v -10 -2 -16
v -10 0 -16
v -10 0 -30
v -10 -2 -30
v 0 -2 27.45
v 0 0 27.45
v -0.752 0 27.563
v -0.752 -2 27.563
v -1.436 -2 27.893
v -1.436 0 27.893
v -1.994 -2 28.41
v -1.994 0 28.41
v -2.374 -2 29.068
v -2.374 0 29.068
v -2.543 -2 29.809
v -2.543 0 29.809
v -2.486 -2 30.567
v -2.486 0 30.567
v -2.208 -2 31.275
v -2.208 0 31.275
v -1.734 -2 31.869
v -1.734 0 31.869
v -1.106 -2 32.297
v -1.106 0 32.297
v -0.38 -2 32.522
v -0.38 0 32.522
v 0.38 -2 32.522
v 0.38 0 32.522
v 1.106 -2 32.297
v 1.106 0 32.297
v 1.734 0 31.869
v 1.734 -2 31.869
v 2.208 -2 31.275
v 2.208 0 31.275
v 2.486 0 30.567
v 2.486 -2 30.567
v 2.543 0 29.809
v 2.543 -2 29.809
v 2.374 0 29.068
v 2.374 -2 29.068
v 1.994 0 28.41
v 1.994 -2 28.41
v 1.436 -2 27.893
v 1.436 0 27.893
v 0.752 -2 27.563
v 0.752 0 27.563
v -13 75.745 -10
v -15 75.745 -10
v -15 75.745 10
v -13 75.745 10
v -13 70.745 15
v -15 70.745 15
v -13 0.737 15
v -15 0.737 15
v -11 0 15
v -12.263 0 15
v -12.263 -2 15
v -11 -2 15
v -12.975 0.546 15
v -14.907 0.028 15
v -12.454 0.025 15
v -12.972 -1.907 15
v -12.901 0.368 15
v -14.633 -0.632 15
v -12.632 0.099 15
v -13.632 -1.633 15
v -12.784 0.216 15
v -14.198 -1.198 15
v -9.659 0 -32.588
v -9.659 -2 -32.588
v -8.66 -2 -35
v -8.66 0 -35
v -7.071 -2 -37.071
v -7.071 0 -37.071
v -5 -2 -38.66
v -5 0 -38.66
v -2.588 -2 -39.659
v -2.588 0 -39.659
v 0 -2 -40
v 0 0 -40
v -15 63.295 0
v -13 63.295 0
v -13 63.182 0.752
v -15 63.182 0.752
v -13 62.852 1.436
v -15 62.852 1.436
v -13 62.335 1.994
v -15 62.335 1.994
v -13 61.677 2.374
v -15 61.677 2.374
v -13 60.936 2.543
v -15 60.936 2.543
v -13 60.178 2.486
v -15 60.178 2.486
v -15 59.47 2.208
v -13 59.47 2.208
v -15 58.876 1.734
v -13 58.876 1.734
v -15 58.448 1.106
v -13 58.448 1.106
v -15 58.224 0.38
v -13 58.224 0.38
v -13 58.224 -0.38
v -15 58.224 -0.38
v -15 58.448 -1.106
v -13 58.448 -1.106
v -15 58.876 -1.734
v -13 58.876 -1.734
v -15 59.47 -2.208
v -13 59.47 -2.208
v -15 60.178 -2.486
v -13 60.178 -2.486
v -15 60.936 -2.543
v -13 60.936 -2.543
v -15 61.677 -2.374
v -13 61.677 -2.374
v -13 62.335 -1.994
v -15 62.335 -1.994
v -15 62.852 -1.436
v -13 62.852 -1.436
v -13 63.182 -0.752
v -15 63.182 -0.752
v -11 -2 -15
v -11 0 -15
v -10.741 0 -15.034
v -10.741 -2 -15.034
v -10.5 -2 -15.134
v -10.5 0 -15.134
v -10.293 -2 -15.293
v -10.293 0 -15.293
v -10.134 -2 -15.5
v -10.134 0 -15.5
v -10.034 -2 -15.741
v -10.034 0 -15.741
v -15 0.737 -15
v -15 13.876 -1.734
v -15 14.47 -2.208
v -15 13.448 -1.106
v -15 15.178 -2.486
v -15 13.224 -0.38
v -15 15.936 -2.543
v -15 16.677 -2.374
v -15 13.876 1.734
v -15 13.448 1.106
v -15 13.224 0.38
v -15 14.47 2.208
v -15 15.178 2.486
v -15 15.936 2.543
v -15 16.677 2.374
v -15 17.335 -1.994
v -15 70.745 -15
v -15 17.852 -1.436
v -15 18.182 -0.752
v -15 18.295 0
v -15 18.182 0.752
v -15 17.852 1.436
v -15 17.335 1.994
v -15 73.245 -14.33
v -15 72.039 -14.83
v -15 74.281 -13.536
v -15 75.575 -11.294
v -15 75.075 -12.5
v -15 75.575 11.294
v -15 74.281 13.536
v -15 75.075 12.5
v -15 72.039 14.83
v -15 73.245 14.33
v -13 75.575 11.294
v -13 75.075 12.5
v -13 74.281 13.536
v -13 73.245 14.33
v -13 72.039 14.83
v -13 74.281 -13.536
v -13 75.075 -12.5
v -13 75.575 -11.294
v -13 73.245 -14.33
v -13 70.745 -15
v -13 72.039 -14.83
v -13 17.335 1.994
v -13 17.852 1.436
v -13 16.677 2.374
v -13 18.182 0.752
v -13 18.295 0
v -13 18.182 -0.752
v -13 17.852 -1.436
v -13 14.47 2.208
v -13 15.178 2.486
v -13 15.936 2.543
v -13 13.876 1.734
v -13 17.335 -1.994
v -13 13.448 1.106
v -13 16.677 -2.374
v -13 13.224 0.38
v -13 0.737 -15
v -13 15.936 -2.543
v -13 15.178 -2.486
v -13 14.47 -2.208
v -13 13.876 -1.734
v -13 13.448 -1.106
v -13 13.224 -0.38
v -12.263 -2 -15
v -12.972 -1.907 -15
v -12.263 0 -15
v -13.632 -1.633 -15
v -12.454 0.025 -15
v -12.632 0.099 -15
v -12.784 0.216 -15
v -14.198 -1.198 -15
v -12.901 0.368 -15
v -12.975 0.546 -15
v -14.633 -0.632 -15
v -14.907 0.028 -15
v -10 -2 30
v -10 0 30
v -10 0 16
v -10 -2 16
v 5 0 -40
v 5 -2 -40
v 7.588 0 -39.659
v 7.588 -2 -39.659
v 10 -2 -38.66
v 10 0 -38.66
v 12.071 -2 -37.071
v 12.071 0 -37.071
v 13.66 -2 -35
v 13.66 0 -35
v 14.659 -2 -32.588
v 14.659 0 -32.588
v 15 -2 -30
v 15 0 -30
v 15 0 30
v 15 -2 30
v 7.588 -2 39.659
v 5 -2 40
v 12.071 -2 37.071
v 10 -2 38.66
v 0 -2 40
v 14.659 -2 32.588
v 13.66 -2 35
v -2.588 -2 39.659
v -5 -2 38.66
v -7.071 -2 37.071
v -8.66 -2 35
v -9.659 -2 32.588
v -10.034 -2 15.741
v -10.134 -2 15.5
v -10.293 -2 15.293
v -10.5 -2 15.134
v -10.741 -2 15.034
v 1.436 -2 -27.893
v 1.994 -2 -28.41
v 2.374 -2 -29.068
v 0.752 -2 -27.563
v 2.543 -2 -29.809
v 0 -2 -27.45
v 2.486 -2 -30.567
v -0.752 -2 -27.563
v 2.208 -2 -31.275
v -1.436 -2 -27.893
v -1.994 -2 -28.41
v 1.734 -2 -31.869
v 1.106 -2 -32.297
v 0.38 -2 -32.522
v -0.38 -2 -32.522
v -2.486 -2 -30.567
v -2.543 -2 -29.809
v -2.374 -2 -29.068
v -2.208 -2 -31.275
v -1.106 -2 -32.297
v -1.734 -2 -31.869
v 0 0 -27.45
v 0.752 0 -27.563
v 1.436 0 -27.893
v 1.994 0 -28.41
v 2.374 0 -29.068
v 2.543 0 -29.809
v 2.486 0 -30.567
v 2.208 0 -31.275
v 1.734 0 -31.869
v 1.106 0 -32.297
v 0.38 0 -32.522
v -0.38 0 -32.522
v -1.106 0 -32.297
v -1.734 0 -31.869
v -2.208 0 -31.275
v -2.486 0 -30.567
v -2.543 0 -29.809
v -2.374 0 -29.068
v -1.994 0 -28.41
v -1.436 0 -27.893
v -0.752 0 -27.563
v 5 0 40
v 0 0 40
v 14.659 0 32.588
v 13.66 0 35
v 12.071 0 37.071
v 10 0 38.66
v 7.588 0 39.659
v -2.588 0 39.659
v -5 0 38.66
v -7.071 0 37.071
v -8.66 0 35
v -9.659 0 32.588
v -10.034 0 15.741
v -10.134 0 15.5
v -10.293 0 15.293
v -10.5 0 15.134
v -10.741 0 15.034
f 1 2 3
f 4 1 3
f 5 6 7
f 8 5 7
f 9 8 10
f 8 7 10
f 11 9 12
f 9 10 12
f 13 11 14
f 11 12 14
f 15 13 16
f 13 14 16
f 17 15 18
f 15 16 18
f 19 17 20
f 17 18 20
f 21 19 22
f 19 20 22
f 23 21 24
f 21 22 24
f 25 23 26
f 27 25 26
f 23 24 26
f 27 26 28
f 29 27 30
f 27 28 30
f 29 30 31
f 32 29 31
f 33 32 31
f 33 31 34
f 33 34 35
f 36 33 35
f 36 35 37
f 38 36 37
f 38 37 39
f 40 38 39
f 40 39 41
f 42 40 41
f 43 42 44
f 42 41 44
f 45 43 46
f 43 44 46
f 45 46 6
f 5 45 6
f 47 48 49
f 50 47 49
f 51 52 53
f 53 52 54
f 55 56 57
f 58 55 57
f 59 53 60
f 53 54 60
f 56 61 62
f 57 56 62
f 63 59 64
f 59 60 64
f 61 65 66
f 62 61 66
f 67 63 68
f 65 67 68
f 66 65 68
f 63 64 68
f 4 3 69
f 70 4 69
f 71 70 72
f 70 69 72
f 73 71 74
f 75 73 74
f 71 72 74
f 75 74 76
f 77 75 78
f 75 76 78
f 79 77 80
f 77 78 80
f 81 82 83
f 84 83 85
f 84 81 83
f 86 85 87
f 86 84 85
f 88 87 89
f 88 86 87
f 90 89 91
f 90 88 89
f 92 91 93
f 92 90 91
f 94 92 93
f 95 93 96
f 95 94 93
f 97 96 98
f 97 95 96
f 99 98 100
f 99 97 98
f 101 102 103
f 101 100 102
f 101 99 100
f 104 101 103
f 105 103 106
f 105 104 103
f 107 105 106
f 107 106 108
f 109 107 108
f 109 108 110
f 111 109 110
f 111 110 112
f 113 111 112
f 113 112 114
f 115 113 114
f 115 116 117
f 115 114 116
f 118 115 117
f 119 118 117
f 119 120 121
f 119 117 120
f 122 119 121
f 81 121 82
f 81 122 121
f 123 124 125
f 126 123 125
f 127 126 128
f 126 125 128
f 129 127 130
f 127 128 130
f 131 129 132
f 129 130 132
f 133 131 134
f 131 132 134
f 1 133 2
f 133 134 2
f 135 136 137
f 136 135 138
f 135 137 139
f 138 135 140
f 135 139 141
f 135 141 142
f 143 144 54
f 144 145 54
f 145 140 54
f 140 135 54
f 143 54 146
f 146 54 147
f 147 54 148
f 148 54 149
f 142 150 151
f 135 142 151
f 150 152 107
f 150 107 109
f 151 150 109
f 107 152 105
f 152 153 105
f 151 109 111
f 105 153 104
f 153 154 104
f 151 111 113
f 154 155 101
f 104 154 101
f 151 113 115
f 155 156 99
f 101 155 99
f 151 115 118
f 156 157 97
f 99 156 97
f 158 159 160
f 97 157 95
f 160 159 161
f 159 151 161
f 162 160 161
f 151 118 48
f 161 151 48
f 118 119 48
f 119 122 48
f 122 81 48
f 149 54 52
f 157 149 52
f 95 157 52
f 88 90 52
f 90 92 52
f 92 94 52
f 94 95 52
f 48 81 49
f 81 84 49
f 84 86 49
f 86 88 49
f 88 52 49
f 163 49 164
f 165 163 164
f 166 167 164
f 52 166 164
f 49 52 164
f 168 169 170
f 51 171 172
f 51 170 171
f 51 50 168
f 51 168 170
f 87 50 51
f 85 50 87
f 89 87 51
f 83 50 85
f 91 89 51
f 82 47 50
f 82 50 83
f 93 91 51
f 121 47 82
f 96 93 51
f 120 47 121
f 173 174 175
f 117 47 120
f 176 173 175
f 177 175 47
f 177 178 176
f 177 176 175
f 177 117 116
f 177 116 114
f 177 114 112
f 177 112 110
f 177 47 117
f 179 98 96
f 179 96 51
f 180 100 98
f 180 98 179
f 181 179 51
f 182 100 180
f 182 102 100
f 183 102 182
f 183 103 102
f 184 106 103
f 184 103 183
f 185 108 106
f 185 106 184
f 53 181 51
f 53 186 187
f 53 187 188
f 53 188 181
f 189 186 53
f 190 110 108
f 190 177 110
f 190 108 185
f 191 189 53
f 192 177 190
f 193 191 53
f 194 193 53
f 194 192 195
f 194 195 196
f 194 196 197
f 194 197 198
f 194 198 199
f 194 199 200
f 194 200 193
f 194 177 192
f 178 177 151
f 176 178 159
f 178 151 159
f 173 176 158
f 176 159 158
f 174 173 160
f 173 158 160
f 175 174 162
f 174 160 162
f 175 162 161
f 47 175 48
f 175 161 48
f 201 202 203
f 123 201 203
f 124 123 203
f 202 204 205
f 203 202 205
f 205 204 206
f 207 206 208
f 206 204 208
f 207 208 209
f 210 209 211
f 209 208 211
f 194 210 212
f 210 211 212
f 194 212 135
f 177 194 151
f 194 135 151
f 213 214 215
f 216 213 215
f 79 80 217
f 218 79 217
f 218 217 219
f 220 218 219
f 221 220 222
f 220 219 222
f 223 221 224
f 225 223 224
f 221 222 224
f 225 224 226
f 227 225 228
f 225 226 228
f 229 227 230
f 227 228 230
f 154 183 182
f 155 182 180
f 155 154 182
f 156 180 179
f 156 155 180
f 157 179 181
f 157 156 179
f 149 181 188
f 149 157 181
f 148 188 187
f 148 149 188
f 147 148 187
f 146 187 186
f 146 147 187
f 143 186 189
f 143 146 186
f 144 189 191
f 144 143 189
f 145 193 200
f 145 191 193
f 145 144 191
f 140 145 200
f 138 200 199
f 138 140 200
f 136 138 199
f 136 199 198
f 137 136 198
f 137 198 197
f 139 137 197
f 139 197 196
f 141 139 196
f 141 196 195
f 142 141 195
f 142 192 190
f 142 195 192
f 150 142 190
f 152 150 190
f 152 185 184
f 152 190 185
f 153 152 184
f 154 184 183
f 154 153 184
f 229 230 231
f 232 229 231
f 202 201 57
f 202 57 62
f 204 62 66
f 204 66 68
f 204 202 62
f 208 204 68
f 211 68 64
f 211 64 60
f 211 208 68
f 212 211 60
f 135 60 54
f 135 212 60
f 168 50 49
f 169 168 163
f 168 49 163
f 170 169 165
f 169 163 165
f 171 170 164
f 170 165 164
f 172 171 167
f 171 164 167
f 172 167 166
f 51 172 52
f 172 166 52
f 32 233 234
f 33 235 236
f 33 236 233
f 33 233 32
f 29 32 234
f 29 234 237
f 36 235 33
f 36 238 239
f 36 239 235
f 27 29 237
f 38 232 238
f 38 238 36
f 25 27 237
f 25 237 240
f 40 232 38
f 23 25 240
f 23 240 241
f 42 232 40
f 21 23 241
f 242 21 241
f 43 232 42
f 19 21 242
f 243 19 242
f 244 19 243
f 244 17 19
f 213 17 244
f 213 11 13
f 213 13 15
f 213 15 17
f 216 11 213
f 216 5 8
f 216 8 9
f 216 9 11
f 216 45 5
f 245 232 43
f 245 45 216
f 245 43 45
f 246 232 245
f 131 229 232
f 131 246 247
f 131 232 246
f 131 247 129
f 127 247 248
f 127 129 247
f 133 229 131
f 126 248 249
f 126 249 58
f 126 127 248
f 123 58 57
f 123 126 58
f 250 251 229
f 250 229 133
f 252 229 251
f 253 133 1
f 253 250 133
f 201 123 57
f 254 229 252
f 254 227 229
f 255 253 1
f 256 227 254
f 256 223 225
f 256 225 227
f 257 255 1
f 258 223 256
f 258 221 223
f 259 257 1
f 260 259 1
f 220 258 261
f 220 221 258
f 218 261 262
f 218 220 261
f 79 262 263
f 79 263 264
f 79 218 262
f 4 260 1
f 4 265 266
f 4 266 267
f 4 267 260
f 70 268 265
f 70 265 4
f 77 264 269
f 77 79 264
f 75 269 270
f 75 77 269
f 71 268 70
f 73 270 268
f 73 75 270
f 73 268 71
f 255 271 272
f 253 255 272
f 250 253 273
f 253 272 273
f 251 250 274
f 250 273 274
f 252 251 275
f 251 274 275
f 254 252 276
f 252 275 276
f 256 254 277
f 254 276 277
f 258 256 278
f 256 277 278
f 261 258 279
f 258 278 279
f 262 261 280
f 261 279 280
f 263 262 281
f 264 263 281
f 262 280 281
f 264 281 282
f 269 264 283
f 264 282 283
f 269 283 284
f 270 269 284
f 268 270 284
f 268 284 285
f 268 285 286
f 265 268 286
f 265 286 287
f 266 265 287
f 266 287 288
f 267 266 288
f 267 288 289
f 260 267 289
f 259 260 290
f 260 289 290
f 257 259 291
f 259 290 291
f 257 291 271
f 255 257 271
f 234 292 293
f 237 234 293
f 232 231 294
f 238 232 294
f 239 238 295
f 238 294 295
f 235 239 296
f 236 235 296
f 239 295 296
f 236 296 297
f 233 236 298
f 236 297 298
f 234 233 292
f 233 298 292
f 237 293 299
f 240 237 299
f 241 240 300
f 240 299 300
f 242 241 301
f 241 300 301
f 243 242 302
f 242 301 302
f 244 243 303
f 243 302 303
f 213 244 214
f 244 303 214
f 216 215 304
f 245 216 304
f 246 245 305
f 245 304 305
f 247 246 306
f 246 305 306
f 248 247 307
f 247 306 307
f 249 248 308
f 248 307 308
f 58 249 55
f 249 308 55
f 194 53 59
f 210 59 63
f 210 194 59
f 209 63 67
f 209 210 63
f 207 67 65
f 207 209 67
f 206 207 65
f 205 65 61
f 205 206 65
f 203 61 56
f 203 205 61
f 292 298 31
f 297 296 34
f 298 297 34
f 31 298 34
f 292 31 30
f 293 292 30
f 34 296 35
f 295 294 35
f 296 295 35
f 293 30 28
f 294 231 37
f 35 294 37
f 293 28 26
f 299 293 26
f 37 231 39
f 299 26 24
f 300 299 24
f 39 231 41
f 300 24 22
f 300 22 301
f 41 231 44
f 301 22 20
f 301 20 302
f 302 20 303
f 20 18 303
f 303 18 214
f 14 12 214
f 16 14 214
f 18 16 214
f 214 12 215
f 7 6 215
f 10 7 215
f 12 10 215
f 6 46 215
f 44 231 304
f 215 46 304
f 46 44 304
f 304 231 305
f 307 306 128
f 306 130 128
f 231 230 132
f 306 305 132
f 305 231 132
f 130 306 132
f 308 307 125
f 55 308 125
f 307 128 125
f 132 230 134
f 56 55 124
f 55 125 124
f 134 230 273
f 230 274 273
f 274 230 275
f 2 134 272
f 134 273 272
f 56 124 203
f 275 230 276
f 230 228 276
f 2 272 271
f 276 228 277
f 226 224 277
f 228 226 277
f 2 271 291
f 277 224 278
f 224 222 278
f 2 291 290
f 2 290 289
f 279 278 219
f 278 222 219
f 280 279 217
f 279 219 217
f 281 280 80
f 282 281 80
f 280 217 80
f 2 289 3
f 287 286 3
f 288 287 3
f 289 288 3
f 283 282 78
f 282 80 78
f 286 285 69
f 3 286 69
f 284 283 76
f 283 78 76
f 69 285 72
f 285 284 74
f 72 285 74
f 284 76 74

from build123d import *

# Parameters (mm, degrees)
SKETCH1_R                  = 2.55
BASE_FLANGE1_DEPTH         = 2
SKETCHED_START             = -90
SKETCHED_BEND1_OUTLINE_W   = 2
SKETCHED_BEND1_OUTLINE_H   = 30
SKETCHED_BEND1_DEPTH       = 75
SKETCHED_START_2           = -14.733838284
SKETCHED_BEND1_2_OUTLINE_R = 2.55
SKETCHED_BEND1_2_DEPTH     = 1.733838284
SKETCHED_START_3           = -15
SKETCHED_BEND1_3_OUTLINE_R = 2.55
SKETCHED_BEND1_3_DEPTH     = 2.7366
SKETCHED_START_4           = -16
SKETCHED_BEND1_4_DEPTH     = 31


with BuildPart() as part:
    # Base-Flange1: sheet metal written as solids
    # Sketch1 → Base-Flange1 (new body)
    with BuildSketch(Plane(origin=(0, 0, 0), x_dir=(1, 0, 0), z_dir=(0, 1, 0))):
        with BuildLine():
            Line((0, 40), (5, 40))
            ThreePointArc((5, 40), (12.071067812, 37.071067812), (15, 30))
            Line((15, 30), (15, 0))
            Line((15, 0), (15, -30))
            ThreePointArc((15, -30), (12.071067812, -37.071067812), (5, -40))
            Line((5, -40), (0, -40))
            ThreePointArc((0, -40), (-7.071067812, -37.071067812), (-10, -30))
            Line((-10, -30), (-10, -16))
            ThreePointArc((-10, -16), (-10.292893219, -15.292893219), (-11, -15))
            Line((-11, -15), (-20, -15))
            Line((-20, -15), (-85, -15))
            ThreePointArc((-85, -15), (-88.535533906, -13.535533906), (-90, -10))
            Line((-90, -10), (-90, 10))
            ThreePointArc((-90, 10), (-88.535533906, 13.535533906), (-85, 15))
            Line((-85, 15), (-20, 15))
            Line((-20, 15), (-11, 15))
            ThreePointArc((-11, 15), (-10.292893219, 15.292893219), (-10, 16))
            Line((-10, 16), (-10, 30))
            ThreePointArc((-10, 30), (-7.071067812, 37.071067812), (0, 40))
        make_face()
        with Locations(Location((0, -30, 0), (0, 0, 90))):
            Circle(SKETCH1_R, mode=Mode.SUBTRACT)
        with Locations(Location((0, 30, 0), (0, 0, 270))):
            Circle(SKETCH1_R, mode=Mode.SUBTRACT)
        with Locations(Location((-75, 0, 0), (0, 0, 270))):
            Circle(SKETCH1_R, mode=Mode.SUBTRACT)
        with Locations(Location((-30, 0, 0), (0, 0, 270))):
            Circle(SKETCH1_R, mode=Mode.SUBTRACT)
    extrude(amount=-BASE_FLANGE1_DEPTH)

    # Sketched Bend1: read off the stored shape, not the designer's step
    # Sketched Bend1 outline → Sketched Bend1 (cut)
    with BuildSketch(Plane.YZ.offset(SKETCHED_START)):
        with Locations((-1, 0)):
            Rectangle(SKETCHED_BEND1_OUTLINE_W, SKETCHED_BEND1_OUTLINE_H)
    extrude(amount=SKETCHED_BEND1_DEPTH, mode=Mode.SUBTRACT)

    # Sketched Bend1 2 outline → Sketched Bend1 2 (add)
    with BuildSketch(Plane.YZ.offset(SKETCHED_START_2)):
        with BuildLine():
            ThreePointArc((75.745355099, 10), (74.280889005, 13.535533906), (70.745355099, 15))
            Line((70.745355099, 15), (0, 15))
            Line((0, 15), (0, -15))
            Line((0, -15), (70.745355099, -15))
            ThreePointArc((70.745355099, -15), (74.280889005, -13.535533906), (75.745355099, -10))
            Line((75.745355099, -10), (75.745355099, 10))
        make_face()
        with Locations((15.745355099, 0)):
            Circle(SKETCHED_BEND1_2_OUTLINE_R, mode=Mode.SUBTRACT)
        with Locations((60.745355099, 0)):
            Circle(SKETCHED_BEND1_2_OUTLINE_R, mode=Mode.SUBTRACT)
    extrude(amount=SKETCHED_BEND1_2_DEPTH)

    # Sketched Bend1 3 outline → Sketched Bend1 3 (add)
    with BuildSketch(Plane.YZ.offset(SKETCHED_START_3)):
        with BuildLine():
            ThreePointArc((75.745355099, 10), (74.280889005, 13.535533906), (70.745355099, 15))
            Line((70.745355099, 15), (0, 15))
            Line((0, 15), (0, -15))
            Line((0, -15), (70.745355099, -15))
            ThreePointArc((70.745355099, -15), (74.280889005, -13.535533906), (75.745355099, -10))
            Line((75.745355099, -10), (75.745355099, 10))
        make_face()
        with Locations((15.745355099, 0)):
            Circle(SKETCHED_BEND1_3_OUTLINE_R, mode=Mode.SUBTRACT)
        with Locations((60.745355099, 0)):
            Circle(SKETCHED_BEND1_3_OUTLINE_R, mode=Mode.SUBTRACT)
    extrude(amount=SKETCHED_BEND1_3_DEPTH)

    # Sketched Bend1 4 outline → Sketched Bend1 4 (cut)
    with BuildSketch(Plane.XY.offset(SKETCHED_START_4)):
        with BuildLine():
            Line((-12.2634, 75.745355099), (-13, 75.745355099))
            Line((-13, 75.745355099), (-13, 0.7366))
            ThreePointArc((-13, 0.7366), (-12.784254855, 0.215745145), (-12.2634, 0))
            Line((-12.2634, 0), (-12.2634, 75.745355099))
        make_face()
        with BuildLine():
            ThreePointArc((-12.2634, -2), (-14.198468417, -1.198468417), (-15, 0.7366))
            Line((-15, 0.7366), (-15, -2))
            Line((-15, -2), (-12.2634, -2))
        make_face()
    extrude(amount=SKETCHED_BEND1_4_DEPTH, mode=Mode.SUBTRACT)


solid = part.part
